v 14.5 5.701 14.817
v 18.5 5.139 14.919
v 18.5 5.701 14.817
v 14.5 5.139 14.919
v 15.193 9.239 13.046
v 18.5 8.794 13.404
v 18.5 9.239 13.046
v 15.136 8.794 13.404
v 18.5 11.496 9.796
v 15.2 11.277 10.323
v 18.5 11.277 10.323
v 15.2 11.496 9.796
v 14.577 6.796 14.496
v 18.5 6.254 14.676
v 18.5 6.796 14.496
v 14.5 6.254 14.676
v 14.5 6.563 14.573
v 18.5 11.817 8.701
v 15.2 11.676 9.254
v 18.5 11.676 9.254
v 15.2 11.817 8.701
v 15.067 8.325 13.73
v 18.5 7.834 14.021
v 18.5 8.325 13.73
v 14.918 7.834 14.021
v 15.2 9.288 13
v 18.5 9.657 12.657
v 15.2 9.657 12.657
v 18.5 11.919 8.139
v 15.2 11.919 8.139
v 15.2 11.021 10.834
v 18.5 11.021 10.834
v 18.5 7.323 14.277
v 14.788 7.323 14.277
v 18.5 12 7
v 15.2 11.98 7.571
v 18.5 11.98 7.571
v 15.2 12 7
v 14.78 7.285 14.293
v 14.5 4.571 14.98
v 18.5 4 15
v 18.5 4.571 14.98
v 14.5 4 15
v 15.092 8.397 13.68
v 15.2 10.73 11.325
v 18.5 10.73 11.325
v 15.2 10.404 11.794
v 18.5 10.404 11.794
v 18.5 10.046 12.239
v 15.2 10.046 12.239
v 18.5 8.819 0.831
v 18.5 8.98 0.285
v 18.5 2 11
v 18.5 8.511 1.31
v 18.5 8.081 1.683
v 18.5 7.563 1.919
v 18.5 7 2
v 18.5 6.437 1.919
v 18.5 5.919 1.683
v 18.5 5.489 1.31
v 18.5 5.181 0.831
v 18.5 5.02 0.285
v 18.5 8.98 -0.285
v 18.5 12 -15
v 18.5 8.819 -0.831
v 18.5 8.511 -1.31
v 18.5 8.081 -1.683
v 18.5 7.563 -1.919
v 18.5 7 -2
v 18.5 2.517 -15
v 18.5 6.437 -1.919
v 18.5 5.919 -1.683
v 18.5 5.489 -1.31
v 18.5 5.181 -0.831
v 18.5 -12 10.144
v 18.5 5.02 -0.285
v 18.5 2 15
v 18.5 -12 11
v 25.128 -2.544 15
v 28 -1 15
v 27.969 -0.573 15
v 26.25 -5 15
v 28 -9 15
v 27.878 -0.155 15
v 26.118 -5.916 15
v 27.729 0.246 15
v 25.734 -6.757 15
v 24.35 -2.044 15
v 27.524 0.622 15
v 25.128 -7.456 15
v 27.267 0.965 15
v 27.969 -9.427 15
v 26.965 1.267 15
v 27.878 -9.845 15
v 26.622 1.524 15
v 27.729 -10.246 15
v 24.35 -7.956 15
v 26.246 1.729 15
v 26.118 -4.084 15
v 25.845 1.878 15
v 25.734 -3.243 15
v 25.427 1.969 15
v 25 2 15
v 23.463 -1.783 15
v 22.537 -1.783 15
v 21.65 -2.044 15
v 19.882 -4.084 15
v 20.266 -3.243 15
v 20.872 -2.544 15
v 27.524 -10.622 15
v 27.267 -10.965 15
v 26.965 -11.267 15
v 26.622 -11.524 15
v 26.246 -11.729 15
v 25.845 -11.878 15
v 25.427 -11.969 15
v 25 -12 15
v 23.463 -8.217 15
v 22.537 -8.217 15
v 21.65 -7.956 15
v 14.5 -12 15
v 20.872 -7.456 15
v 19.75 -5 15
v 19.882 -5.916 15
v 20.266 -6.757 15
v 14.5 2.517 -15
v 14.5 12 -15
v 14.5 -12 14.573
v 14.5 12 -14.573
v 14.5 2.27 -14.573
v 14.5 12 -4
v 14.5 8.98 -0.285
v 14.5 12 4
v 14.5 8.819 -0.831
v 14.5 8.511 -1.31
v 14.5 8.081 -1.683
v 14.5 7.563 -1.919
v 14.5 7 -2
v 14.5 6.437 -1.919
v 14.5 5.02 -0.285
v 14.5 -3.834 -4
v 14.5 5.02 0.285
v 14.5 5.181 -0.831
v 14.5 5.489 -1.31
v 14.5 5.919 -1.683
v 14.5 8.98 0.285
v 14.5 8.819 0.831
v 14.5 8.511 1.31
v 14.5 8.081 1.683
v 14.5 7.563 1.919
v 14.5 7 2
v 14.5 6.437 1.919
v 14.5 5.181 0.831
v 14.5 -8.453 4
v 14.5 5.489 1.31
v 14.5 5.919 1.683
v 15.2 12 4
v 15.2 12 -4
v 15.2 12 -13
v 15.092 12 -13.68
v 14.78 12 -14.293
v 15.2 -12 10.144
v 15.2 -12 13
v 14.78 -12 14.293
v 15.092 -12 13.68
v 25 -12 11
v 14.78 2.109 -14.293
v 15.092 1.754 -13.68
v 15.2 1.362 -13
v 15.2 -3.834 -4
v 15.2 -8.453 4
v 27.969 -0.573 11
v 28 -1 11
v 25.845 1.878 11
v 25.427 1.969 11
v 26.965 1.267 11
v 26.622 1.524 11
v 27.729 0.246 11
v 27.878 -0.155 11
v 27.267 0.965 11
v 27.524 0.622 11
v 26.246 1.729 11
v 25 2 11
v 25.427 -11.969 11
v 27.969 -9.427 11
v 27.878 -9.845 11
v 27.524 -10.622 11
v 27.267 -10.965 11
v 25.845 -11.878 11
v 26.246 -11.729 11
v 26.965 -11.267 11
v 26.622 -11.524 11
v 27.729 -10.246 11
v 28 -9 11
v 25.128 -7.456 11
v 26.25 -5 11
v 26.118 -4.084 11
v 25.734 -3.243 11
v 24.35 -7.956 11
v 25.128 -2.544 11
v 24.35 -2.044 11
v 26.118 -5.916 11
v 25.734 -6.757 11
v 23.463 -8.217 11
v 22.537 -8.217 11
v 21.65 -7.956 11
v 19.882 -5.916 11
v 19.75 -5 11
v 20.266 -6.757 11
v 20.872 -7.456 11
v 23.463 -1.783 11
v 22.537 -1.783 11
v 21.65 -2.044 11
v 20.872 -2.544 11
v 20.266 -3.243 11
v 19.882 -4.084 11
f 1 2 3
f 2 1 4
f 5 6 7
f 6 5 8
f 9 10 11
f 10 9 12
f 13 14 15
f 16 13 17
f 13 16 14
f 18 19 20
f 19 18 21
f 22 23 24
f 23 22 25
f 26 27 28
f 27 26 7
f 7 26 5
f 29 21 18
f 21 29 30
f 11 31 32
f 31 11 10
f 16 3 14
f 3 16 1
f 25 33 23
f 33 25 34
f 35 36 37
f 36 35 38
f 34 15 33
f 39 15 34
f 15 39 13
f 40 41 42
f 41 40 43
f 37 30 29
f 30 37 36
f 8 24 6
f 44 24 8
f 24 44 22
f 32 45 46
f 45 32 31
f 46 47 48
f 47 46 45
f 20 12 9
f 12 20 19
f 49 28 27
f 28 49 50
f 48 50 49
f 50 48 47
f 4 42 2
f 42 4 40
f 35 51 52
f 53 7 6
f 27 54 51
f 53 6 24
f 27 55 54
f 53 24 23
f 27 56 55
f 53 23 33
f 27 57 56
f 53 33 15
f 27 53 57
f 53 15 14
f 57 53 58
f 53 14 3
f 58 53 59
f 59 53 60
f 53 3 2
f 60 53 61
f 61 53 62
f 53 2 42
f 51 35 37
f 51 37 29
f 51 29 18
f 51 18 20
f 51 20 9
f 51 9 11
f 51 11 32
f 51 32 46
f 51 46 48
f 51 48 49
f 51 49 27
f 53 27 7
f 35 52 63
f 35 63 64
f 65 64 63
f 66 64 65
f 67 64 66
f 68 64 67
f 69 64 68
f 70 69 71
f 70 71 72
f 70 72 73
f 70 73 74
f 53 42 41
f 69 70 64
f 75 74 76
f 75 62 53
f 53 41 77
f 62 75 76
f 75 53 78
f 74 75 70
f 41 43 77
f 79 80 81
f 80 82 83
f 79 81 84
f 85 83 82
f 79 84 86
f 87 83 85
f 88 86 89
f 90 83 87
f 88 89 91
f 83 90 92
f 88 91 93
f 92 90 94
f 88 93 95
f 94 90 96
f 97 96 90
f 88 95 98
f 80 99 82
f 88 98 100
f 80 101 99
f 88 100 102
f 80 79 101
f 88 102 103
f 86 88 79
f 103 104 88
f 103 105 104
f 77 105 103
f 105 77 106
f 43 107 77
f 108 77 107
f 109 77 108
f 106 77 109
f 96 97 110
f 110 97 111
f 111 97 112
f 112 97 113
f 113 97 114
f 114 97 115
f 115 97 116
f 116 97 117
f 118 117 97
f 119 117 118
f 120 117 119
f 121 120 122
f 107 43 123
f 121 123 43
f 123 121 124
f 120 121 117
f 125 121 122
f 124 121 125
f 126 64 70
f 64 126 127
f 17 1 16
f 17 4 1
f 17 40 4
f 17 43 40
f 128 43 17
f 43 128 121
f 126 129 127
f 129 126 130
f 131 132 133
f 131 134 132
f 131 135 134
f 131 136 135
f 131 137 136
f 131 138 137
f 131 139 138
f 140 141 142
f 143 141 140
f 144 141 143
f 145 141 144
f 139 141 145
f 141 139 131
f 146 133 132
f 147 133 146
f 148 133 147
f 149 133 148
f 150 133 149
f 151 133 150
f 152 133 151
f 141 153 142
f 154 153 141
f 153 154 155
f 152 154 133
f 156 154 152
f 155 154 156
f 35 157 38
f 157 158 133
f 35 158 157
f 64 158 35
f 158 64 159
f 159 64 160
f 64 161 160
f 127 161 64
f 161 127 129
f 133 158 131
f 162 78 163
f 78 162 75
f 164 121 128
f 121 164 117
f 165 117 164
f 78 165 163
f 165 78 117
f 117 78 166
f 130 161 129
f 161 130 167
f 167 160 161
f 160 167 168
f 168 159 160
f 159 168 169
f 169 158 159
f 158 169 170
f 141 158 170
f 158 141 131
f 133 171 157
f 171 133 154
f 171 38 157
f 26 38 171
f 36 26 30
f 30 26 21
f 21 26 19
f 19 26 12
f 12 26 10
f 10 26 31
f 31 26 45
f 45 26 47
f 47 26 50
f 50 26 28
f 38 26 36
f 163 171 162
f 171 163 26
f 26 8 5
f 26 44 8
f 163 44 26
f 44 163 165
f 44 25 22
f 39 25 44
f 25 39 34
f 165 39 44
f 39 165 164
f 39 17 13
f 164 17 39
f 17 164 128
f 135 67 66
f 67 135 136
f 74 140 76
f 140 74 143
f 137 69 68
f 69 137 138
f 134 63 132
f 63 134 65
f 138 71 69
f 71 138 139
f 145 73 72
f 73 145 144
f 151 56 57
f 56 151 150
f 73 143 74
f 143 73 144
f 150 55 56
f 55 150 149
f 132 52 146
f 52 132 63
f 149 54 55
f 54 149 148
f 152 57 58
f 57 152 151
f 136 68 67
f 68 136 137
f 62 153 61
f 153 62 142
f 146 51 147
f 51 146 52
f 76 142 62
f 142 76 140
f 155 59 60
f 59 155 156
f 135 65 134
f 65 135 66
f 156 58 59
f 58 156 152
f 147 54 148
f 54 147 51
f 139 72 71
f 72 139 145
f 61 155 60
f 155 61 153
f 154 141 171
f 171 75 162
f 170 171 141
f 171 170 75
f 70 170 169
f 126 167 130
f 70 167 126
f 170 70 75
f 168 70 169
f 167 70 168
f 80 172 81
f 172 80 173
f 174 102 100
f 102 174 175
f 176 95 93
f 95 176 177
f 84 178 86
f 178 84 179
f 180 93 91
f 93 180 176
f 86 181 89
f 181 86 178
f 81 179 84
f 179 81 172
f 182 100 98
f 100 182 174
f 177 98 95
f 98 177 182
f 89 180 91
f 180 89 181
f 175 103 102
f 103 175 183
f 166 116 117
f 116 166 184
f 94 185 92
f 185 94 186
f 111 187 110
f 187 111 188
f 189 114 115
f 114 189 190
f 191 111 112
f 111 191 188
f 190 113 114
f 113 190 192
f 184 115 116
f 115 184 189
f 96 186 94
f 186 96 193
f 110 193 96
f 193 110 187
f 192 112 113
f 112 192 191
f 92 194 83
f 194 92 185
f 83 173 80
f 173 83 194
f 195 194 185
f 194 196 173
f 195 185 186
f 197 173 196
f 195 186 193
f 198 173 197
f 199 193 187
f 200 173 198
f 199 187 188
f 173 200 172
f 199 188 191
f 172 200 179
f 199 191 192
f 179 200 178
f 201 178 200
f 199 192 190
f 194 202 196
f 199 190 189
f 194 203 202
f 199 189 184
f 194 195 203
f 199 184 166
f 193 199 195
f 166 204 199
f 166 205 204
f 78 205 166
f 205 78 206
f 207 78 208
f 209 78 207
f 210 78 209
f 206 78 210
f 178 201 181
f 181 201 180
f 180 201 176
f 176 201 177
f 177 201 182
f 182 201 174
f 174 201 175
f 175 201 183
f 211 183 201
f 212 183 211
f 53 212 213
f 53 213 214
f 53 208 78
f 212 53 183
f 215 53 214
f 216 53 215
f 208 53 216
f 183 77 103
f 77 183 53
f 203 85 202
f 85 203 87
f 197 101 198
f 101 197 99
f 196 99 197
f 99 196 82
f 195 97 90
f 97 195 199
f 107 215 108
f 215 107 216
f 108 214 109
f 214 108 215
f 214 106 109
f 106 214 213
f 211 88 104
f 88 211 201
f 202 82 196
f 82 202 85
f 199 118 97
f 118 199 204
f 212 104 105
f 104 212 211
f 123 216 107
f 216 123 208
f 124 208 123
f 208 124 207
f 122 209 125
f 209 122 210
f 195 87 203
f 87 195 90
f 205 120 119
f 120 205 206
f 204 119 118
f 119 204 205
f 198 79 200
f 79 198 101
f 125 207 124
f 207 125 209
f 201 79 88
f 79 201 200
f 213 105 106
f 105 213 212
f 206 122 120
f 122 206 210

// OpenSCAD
// file: ../Parts/rounder.scad
// rounder.scad
// cutting tool for rounding off corners with a cylinder

//---------------------
module rounder(
r=10,   // radius
h=10,   // height
f=22,    // $fn
extra=0.01  // extra size for the cube
){

difference(){
  translate([-extra,-extra,-extra])
  cube([r+extra,r+extra,h+2*extra]);
  translate([r,r,-1])
  cylinder(r=r,h=h+2,$fn=f);
}

}

//---------------------------------------------------------------------------
module bevel(x=1,y=1,h=10){

linear_extrude(height=h)
polygon(points=[[0,0],[x,0],[0,y]]);
    
}
  

//========================

rounder();

//========================
// file: ../Parts/tslot.scad
//=================================================================================
// tslot
// models for tslots used in PrusaDusa
// 
// Tom Flint, 2020
//=================================================================================
module tslot1(
tol = 0.0,
len = 60,
type = 1
){
    
// 30x30     
if(type==1){
    linear_extrude(height=len,convexity=10)
    difference(){
        offset(r=2.0+tol,$fn=20)
        square([26,26],center=true);
 
        translate([0,12,0])
        square([8.2-tol,8.2-tol],center=true);
        translate([0,-12,0])
        square([8.2-tol,8.2-tol],center=true);
        translate([12,0,0])
        square([8.2-tol,8.2-tol],center=true);
        translate([-12,0,0])
        square([8.2-tol,8.2-tol],center=true);
    }
}
    
// 30x60
if(type==2){
    linear_extrude(height=len,convexity=10)
    difference(){
        offset(r=2.0+tol,$fn=20)
        square([26,56],center=true);
 
        translate([0,27,0])
        square([8.2-tol,8.2-tol],center=true);
        translate([0,-27,0])
        square([8.2-tol,8.2-tol],center=true);
        
        translate([12,15,0])
        square([8.2-tol,8.2-tol],center=true);
        translate([-12,15,0])
        square([8.2-tol,8.2-tol],center=true);

        translate([12,-15,0])
        square([8.2-tol,8.2-tol],center=true);
        translate([-12,-15,0])
        square([8.2-tol,8.2-tol],center=true);
    }
}
    
// 36x60
if(type==3){
    linear_extrude(height=len,convexity=10)
    difference(){
        offset(r=2.0+tol,$fn=20)
        square([56,56],center=true);
 
        translate([15,27,0])
        square([8.2-tol,8.2-tol],center=true);
        translate([15,-27,0])
        square([8.2-tol,8.2-tol],center=true);
        
        translate([-15,27,0])
        square([8.2-tol,8.2-tol],center=true);
        translate([-15,-27,0])
        square([8.2-tol,8.2-tol],center=true);
        
        translate([27,15,0])
        square([8.2-tol,8.2-tol],center=true);
        translate([-27,15,0])
        square([8.2-tol,8.2-tol],center=true);

        translate([27,-15,0])
        square([8.2-tol,8.2-tol],center=true);
        translate([-27,-15,0])
        square([8.2-tol,8.2-tol],center=true);
    }
}
    
}

//--------------------------------------
module tbrace(
tol=0.0
){

F2=22;
 
translate([0,0,2-15])    
difference(){    
union(){
        cube([4.8,60,26]);
        cube([60,4.8,26]);
    
    hull(){
        translate([60-2.4,4.8,0])
        cylinder(r=2.4,h=26,$fn=F2);
        translate([4.8,60-2.4,0])
        cylinder(r=2.4,h=26,$fn=F2);
    }
}    

        translate([15,0,26/2])
        rotate([-90,0,0])
        cylinder(r1=3.5,r2=4.5,h=60,$fn=F2);
        translate([15+30,0,26/2])
        rotate([-90,0,0])
        cylinder(r1=3.5,r2=4.5,h=60,$fn=F2);

        translate([0,15,26/2])
        rotate([0,90,0])
        cylinder(r1=3.5,r2=4.5,h=60,$fn=F2);
        translate([0,15+30,26/2])
        rotate([0,90,0])
        cylinder(r1=3.5,r2=4.5,h=60,$fn=F2);

}
}

//----------------------------------------
module lbrace(
tol=0,
holes=0,
nuts=1
){

F2=22;
    
pts1=[ [5,0], [80,0], [85,5], [85,22], [80,28],
    [28,28], [28,80], [22,85], [5,85], [0,80], [0,5] ];
    
if(holes==1){
    difference(){
        linear_extrude(height=3.25+tol,convexity=10)
        offset(r=tol)
        polygon(points=pts1);
        
        translate([16+30,14,-1])
        cylinder(r=3.25,h=5,$fn=F2);
        translate([16+60,14,-1])
        cylinder(r=3.25,h=5,$fn=F2);

        translate([14,16+30,-1])
        cylinder(r=3.25,h=5,$fn=F2);
        translate([14,16+60,-1])
        cylinder(r=3.25,h=5,$fn=F2);
    }
}else{
        linear_extrude(height=3.25+tol,convexity=10)
        offset(r=tol)
        polygon(points=pts1);
}

if(nuts==1){
    
        translate([16+30,14,0])
        cylinder(r=5,h=6+3.25,$fn=F2);
        translate([16+60,14,0])
        cylinder(r=5,h=6+3.25,$fn=F2);

        translate([14,16+30,0])
        cylinder(r=5,h=6+3.25,$fn=F2);
        translate([14,16+60,0])
        cylinder(r=5,h=6+3.25,$fn=F2);
}

}


//=======================================

lbrace();

translate([50,50,0])
lbrace(tol=0.2);

//tbrace();

/*
color("cyan")
tslot1(len=70);

color("green")
translate([0,15,0])
tslot1(type=2);

color("red")
translate([15,15,0])
tslot1(type=3,len=50);

*/

//=======================================
// main file
//=================================================================================
// RivianSwitch.scad
//
// T-slot mount for power switch, Rivian Ascent boards
//
// Dr Tom Flint, 9 March 2023
//=================================================================================


use <../Parts/tslot.scad>
use <../Parts/rounder.scad>

//---------------------------------------------------------------------------------
module riv(){
  
  difference(){
    // vertical post
    translate([15+1.5,0,0])
    cube([4,24,30],center=true);
    
    // cut for t-slot
    translate([0,30,0])
    rotate([90,0,0])
    tslot1(type=1,len=60,tol=0.2);
    
    // cut for M4x12 bolt, 6 mm thread space
    translate([13,7,0])
    rotate([0,90,0])
    cylinder(r=2.0,h=6,$fn=22);

    translate([15,-20,-16])
    rotate([30,0,0])
    cube([20,40,40],center=true);

    translate([13,12,15])
    rotate([0,90,0])
    rotate([0,0,-90])
    rounder(r=8,h=7,f=88);
    
  }
  
  difference(){
    // switch plate
    translate([15+7,-5,15-2])
    cube([12,14,4],center=true);
    
    // cut for switch post
    translate([15+8,-5,15-5])
    cylinder(r=6.5/2,h=6,$fn=22);

    translate([15+13,7-5,15-5])
    rotate([0,0,180])
    rounder(r=3,h=6,f=44);

    translate([15+13,-7-5,15-5])
    rotate([0,0,90])
    rounder(r=3,h=6,f=44);
  }
  
}

//=================================================================================

if(0){
  translate([0,30,0])
  rotate([90,0,0])
  tslot1(type=1,len=60,tol=0.2);
}

riv();


//=================================================================================
